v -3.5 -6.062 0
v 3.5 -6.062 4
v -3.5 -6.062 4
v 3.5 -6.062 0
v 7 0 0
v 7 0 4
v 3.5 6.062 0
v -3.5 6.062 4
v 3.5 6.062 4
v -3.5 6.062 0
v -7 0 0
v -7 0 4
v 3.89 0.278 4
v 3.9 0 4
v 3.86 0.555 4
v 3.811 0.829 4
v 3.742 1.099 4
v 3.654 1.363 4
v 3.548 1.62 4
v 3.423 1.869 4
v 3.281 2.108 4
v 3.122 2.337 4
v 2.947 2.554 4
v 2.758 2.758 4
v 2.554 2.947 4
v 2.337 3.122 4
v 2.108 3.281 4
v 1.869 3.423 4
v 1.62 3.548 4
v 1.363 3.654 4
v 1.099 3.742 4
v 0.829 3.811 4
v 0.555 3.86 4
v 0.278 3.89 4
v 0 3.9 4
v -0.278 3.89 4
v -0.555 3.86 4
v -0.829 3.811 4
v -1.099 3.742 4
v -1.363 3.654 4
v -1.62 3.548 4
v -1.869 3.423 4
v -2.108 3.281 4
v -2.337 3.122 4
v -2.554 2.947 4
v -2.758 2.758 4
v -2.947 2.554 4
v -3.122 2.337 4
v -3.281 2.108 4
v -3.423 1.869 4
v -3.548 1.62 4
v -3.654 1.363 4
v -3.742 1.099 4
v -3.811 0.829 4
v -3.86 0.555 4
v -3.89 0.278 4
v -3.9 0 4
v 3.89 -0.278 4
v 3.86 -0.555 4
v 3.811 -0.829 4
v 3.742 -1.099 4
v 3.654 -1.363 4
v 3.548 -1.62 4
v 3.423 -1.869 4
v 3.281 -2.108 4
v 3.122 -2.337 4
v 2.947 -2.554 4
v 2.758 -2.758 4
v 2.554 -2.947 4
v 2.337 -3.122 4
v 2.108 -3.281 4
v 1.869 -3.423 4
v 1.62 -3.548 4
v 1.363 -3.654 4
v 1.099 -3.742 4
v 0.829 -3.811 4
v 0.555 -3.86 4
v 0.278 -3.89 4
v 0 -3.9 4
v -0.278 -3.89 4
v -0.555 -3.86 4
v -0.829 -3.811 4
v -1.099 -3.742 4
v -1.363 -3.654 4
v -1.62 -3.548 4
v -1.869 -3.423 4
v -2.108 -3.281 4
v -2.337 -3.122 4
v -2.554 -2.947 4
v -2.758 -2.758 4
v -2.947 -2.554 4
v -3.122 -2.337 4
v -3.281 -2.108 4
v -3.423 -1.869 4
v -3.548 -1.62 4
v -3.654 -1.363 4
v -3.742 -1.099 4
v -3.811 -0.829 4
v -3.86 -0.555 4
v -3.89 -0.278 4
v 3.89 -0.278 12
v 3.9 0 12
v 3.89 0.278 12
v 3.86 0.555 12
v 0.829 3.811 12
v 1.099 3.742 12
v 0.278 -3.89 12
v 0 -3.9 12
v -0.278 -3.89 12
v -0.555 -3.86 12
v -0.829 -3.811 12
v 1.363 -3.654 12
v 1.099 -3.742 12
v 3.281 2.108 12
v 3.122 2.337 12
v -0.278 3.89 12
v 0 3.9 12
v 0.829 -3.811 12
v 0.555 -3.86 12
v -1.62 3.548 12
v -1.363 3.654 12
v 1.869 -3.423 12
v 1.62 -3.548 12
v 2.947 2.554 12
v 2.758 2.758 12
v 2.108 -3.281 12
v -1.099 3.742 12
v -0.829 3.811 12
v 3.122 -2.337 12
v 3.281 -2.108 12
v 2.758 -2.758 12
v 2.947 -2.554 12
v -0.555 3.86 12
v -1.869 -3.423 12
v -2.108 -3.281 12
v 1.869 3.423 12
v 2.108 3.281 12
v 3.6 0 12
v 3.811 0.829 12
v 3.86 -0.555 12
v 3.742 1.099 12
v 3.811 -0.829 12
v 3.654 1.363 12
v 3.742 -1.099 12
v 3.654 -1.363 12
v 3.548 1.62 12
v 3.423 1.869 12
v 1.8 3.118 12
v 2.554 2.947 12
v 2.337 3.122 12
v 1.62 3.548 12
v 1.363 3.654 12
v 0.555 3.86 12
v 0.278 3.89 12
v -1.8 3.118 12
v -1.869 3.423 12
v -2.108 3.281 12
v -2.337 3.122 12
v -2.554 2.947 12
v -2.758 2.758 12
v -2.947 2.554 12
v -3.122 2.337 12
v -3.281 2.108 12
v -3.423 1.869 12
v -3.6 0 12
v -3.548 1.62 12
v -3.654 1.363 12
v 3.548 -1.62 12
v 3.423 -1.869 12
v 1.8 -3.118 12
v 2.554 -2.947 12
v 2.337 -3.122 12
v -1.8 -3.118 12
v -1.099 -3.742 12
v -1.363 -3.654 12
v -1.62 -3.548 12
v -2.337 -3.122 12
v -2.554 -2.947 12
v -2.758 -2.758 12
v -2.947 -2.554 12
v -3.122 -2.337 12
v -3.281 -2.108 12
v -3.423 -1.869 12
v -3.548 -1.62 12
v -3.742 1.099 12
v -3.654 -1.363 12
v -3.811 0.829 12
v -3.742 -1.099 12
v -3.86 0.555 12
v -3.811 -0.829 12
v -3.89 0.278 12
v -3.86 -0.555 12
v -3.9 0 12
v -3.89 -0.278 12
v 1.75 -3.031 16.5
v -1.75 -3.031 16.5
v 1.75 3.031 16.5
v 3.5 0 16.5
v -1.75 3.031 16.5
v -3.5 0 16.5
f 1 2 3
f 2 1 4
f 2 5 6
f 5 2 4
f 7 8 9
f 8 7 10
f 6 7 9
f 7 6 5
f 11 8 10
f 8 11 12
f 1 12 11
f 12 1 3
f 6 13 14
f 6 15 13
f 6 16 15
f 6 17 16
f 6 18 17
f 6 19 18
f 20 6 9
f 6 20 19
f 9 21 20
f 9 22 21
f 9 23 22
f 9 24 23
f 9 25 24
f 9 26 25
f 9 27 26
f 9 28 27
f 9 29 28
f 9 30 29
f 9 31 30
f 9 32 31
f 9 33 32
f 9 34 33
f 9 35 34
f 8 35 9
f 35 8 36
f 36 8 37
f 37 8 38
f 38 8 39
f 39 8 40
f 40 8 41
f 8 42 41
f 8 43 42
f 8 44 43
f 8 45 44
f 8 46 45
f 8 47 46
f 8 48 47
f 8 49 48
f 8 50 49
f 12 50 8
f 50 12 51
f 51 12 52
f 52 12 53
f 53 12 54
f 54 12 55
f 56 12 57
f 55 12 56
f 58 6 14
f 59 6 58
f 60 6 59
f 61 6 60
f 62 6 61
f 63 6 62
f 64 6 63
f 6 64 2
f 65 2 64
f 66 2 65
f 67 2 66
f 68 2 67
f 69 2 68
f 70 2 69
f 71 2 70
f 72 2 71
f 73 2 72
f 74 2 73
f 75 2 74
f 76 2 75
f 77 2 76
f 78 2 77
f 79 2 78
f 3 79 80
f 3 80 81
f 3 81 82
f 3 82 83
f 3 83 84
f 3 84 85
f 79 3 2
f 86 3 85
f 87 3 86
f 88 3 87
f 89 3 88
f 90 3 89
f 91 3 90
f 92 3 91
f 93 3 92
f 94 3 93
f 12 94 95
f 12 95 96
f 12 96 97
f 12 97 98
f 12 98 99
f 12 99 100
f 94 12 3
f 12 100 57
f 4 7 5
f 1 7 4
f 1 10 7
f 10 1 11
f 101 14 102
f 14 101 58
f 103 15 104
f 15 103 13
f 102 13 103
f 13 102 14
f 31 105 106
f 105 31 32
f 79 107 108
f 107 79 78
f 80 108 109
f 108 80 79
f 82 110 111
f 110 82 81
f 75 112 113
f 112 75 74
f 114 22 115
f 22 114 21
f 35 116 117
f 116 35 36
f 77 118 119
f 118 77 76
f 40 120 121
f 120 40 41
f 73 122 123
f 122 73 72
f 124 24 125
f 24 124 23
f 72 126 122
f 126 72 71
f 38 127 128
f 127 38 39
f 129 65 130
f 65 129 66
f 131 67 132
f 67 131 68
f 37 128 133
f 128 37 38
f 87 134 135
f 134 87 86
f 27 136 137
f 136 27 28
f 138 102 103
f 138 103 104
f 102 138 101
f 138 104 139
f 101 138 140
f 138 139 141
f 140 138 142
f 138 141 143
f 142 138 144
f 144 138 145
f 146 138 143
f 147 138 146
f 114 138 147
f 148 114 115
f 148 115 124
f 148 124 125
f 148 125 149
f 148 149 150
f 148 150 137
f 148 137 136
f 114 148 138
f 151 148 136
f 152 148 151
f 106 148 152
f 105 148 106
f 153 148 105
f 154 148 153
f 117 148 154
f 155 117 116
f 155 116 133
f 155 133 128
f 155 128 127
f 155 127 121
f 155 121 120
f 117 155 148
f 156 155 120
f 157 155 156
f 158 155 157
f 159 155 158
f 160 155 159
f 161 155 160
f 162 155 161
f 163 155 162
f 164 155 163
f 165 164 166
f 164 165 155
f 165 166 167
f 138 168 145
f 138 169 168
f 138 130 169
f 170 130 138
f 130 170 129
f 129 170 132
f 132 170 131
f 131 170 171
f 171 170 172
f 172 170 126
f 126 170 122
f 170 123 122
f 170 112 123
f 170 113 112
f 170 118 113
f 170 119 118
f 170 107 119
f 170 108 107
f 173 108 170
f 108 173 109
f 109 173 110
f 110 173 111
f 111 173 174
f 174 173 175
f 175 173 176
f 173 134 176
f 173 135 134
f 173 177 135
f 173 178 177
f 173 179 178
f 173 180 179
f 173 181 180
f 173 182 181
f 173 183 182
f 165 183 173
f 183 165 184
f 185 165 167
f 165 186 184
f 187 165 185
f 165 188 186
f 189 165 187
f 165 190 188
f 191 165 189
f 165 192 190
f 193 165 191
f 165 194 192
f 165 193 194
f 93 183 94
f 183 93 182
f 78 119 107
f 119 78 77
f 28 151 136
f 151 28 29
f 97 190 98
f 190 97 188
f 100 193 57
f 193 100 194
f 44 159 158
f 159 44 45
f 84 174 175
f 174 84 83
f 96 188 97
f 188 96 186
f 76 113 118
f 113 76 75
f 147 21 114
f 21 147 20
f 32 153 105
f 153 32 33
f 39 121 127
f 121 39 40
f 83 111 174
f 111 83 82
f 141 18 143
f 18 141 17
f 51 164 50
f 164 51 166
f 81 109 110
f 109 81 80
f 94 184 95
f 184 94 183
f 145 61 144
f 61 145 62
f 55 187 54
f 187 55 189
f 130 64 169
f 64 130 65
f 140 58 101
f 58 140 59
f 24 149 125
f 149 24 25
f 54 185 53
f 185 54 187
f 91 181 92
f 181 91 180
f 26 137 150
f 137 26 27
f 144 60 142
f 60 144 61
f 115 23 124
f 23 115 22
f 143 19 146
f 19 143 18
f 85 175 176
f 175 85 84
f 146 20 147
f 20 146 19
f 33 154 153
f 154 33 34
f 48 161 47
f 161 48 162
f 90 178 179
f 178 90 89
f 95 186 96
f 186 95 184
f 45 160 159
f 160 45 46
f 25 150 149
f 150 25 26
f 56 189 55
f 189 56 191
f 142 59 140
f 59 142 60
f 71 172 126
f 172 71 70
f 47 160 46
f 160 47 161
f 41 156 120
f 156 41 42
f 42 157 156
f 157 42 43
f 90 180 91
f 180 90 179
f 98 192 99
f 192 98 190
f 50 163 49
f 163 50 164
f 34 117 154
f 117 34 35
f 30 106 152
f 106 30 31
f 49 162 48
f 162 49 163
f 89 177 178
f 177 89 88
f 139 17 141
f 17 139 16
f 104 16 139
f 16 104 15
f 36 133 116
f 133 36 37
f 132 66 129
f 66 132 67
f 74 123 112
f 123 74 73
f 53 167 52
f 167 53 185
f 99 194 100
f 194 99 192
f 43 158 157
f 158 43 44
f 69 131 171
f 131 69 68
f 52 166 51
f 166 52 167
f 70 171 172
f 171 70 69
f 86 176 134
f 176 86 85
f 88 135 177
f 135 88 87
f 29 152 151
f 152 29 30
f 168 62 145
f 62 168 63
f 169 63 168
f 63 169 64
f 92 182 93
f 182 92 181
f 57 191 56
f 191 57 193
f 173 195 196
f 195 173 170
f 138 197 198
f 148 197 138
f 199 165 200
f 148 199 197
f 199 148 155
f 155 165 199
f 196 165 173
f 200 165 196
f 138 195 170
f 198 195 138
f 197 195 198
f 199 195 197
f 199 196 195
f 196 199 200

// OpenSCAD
// axle.scad
// scanner part
F2=88;
//--------------------------------------------------------------------
module axle(){

  // ewheel engage
  cylinder(r=7,$fn=6,h=11);
  // thru the bearing
  translate([0,0,11])
  cylinder(r=7.8/2,h=8,$fn=F2);
  // arm engage
  translate([0,0,11+8])
  cylinder(r1=3.6,r2=3.5,h=4.5,$fn=6);
  
  // Add a fancy button top
  difference(){
    translate([0,0,-3])
    cylinder(r1=10,r2=12,h=2,$fn=F2);
    translate([0,0,-3.1])
    linear_extrude(height=1,convexity=6)
    scale([3.5,3.5])
    penrose_tiling(n=2, w=0.2);
  }
  translate([0,0,-1])
  cylinder(r1=12,r2=12,h=1,$fn=F2);
  
  
}

  
//--------------------------------------------------------------------
module axle2(){

  // ewheel engage
  cylinder(r=7,$fn=6,h=4);
  // thru the bearing
  translate([0,0,4])
  cylinder(r=7.8/2,h=8,$fn=F2);
  // arm engage
  translate([0,0,4+8])
  cylinder(r1=3.6,r2=3.5,h=4.5,$fn=6);
  
  
  
}


//=================================

axle2();

//========================================
